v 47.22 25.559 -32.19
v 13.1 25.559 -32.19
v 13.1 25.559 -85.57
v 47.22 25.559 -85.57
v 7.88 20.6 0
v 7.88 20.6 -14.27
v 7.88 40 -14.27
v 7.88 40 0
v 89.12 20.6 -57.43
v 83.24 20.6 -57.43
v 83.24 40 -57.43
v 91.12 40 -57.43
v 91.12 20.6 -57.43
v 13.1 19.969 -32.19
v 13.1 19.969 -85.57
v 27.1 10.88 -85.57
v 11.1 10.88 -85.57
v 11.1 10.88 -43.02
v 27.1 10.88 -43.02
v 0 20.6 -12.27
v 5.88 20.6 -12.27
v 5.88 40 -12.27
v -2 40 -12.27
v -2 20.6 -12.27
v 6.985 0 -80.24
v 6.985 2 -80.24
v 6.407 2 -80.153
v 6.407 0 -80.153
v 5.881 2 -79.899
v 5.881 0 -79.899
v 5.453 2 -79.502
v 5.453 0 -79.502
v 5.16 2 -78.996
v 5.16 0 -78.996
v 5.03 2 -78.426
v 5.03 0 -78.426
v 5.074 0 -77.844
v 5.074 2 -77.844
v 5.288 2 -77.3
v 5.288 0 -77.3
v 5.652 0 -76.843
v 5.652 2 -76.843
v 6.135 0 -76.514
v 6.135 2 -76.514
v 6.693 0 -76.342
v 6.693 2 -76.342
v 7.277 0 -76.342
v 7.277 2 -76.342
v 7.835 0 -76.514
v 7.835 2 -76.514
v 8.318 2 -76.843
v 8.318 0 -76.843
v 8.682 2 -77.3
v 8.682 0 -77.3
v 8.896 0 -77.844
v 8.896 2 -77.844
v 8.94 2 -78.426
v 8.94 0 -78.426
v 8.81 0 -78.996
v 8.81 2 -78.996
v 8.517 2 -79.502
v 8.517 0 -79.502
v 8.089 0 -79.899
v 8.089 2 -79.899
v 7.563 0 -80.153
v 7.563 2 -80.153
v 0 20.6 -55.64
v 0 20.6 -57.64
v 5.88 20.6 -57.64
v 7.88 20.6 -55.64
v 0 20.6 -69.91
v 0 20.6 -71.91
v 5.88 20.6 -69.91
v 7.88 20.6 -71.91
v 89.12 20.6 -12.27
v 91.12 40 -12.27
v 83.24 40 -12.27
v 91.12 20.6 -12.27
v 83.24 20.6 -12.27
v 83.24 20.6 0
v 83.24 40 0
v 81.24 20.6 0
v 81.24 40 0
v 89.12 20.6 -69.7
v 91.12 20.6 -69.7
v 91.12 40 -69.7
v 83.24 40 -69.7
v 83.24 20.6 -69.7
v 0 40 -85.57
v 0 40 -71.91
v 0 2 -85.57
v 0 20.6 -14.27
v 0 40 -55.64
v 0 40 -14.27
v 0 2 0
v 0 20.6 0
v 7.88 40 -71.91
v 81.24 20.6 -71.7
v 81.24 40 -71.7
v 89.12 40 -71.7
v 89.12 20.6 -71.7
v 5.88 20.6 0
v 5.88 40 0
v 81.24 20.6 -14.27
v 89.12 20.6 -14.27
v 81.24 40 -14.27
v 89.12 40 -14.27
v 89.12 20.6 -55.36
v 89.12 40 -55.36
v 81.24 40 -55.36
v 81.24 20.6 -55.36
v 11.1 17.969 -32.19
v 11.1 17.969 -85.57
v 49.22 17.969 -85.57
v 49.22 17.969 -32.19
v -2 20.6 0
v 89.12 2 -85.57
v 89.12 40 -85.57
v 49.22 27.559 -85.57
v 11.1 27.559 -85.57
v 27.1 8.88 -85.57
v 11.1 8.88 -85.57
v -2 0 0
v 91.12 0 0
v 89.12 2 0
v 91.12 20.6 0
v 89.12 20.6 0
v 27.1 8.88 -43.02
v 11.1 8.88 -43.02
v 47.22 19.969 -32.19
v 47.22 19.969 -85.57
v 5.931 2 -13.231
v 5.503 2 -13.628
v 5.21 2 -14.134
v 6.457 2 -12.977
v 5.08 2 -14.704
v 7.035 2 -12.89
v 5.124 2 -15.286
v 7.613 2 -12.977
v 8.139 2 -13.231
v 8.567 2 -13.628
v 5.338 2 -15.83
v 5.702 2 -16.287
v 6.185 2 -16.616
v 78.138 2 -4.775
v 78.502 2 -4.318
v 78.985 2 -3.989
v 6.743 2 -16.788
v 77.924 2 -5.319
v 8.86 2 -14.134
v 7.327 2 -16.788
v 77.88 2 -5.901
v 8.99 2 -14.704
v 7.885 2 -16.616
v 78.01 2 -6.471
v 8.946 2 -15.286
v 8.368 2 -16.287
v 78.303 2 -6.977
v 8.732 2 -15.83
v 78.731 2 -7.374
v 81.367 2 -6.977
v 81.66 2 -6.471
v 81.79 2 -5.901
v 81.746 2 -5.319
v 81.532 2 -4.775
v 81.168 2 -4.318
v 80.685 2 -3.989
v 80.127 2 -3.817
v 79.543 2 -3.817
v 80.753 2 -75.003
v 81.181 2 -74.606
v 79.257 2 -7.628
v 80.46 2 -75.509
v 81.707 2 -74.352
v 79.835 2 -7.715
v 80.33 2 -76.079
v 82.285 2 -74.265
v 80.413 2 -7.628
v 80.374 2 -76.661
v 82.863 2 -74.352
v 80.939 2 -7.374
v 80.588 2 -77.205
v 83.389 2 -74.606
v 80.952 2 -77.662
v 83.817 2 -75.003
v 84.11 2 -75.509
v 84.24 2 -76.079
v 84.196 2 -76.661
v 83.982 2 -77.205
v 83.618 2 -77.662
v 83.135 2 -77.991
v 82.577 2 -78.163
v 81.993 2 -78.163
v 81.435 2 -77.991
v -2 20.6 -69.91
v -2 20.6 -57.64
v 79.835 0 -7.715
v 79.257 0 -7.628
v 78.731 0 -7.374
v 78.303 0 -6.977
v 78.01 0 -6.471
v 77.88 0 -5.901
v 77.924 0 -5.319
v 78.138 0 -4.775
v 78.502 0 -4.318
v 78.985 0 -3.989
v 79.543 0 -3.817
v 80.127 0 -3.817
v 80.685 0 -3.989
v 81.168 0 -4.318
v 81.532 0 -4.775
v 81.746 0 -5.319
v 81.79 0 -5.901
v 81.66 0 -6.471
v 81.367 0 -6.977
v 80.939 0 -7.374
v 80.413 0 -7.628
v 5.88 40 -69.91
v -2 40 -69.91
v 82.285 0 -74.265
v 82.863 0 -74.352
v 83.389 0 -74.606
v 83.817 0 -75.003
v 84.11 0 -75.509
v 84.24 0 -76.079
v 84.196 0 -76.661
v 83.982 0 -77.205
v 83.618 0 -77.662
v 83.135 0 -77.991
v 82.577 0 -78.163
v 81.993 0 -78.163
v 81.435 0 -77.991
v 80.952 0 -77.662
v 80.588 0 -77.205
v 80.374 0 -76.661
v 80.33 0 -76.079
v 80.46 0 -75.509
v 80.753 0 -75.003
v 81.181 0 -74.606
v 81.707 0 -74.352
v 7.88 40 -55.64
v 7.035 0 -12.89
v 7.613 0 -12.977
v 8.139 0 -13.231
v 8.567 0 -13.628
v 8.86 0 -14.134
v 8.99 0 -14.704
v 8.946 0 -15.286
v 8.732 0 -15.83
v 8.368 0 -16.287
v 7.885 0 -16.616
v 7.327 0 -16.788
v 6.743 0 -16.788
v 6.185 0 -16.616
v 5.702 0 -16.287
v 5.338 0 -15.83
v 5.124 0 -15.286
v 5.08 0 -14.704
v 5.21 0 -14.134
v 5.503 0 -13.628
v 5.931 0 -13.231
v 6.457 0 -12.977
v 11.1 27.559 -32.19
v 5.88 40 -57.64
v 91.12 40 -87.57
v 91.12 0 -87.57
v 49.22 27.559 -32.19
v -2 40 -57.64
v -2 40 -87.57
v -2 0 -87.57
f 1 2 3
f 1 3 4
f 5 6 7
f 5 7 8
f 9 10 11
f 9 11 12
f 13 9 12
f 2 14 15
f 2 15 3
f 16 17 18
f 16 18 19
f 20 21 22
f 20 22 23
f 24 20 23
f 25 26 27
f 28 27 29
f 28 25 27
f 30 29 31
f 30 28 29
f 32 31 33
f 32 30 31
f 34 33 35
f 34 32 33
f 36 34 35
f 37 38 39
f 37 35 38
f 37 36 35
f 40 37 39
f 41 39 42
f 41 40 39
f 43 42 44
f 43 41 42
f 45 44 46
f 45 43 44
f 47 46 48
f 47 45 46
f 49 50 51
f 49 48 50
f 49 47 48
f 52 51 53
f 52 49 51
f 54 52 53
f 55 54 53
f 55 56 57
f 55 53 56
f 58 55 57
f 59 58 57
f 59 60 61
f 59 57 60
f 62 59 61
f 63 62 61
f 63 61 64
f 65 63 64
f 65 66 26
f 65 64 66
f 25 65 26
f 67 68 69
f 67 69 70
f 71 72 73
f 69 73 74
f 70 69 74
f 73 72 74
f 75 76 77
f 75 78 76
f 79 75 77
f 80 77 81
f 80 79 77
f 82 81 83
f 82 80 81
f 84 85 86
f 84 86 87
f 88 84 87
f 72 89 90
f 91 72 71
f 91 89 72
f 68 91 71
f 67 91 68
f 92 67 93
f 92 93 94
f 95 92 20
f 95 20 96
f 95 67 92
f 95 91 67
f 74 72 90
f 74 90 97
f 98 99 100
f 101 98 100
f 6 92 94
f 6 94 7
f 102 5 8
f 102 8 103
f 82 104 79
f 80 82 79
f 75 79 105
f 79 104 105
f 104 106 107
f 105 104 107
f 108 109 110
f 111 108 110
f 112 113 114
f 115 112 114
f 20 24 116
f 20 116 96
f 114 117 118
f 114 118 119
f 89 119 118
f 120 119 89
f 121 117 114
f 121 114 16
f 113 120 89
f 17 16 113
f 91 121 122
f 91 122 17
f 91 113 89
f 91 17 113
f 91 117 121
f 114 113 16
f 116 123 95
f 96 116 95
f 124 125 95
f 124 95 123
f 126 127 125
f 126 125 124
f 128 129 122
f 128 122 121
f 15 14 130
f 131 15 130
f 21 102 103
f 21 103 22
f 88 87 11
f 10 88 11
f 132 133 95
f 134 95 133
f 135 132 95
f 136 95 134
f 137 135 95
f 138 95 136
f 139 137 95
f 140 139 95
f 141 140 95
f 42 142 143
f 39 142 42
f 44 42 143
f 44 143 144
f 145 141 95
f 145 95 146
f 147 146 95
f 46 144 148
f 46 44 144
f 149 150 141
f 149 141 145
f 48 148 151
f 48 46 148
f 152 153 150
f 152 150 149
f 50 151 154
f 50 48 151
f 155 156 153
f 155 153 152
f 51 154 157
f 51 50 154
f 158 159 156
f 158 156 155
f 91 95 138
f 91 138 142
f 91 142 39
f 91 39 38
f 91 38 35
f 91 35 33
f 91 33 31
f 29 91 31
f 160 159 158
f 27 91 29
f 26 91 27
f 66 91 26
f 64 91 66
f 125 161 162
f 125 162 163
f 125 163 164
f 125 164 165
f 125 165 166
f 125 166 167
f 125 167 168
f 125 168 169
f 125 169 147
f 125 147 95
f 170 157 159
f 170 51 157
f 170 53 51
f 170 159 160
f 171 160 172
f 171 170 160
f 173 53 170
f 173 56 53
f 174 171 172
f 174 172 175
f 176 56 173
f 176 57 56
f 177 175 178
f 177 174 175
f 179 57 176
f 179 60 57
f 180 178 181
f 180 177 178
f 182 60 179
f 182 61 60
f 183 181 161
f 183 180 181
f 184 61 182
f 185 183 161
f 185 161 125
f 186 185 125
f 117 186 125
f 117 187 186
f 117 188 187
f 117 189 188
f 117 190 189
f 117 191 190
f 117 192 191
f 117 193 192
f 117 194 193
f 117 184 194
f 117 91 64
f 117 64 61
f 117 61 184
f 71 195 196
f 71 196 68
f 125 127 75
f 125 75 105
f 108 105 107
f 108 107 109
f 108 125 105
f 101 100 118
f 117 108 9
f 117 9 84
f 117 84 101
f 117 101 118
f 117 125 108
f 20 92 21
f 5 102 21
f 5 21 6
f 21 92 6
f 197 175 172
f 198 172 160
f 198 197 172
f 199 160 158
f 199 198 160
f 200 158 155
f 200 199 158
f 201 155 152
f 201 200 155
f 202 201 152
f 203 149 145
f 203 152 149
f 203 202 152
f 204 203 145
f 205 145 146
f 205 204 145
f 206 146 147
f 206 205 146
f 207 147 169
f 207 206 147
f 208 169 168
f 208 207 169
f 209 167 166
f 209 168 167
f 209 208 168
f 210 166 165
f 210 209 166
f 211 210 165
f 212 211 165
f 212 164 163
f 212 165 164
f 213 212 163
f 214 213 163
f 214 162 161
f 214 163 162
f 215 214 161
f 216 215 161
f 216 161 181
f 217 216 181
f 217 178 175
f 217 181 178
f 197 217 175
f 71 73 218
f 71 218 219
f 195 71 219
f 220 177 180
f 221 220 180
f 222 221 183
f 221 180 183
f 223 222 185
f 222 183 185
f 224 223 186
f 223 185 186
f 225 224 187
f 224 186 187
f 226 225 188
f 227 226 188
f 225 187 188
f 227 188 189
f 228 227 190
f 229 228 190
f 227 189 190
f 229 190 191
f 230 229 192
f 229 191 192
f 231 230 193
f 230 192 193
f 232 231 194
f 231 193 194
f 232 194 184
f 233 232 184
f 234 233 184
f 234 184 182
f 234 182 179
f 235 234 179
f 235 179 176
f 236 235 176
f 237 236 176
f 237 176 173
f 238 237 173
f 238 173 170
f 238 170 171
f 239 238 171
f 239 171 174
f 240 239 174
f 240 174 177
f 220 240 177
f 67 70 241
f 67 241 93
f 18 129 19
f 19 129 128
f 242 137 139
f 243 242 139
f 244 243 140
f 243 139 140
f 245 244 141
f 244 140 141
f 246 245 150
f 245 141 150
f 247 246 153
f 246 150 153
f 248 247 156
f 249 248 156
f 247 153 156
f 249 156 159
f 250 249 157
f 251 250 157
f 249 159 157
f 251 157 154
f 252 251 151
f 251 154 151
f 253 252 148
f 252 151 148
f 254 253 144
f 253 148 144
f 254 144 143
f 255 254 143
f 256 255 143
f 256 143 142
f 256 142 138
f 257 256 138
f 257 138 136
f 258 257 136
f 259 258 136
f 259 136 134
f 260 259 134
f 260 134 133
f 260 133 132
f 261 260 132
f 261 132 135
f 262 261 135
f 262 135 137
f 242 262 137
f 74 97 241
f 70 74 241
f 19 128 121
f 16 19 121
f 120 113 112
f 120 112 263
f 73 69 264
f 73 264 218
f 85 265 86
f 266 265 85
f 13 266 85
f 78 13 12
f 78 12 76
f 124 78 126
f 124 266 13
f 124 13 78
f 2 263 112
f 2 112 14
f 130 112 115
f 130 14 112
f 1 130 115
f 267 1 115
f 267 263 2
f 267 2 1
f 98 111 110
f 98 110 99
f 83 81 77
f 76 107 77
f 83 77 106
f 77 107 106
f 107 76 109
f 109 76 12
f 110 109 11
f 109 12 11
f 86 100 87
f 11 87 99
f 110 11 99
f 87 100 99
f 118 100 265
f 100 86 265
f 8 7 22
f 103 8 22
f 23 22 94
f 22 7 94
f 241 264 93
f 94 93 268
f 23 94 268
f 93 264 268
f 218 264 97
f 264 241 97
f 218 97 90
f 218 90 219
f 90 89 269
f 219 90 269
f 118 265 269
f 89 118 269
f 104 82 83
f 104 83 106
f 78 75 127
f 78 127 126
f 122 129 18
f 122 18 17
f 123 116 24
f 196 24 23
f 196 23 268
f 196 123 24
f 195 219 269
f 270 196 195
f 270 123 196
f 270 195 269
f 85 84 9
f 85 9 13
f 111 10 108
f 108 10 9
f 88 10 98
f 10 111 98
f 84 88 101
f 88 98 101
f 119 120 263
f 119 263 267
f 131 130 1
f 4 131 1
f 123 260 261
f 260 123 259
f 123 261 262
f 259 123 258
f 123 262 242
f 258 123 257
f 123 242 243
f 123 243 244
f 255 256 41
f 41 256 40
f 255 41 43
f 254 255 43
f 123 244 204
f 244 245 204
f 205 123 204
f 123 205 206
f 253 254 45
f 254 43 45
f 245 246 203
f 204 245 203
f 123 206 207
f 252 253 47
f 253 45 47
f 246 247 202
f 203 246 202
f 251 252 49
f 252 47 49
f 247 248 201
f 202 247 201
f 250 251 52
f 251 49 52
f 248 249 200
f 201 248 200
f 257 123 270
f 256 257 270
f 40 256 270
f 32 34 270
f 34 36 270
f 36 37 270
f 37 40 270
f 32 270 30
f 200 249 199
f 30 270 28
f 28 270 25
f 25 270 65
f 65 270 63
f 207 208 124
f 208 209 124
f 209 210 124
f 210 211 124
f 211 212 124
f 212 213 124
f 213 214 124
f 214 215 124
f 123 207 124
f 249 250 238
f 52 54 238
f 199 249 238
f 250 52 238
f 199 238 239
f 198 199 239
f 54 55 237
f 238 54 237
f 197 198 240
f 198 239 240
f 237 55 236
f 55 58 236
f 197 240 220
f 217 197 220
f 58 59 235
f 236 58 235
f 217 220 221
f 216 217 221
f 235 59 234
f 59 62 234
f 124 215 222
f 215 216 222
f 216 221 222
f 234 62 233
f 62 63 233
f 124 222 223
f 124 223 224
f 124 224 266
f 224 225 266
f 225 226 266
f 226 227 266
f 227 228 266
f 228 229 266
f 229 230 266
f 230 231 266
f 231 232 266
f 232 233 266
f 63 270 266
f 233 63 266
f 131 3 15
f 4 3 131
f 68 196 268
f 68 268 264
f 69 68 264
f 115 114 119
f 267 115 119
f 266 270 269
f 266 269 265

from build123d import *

# Parameters (mm, degrees)
SKETCH1_W            = 89.12
SKETCH1_H            = 85.57
BOSS_EXTRUDE1_DEPTH  = 2
SKETCH3_W            = 2
SKETCH3_H            = 30
BOSS_EXTRUDE2_DEPTH  = 85.57
SKETCH4_W            = 2
SKETCH4_H            = 30
BOSS_EXTRUDE3_DEPTH  = 85.57
SKETCH5_W            = 93.12
SKETCH5_H            = 2
BOSS_EXTRUDE4_DEPTH  = 30
SKETCH6_R            = 1.96
CUT_EXTRUDE2_DEPTH   = 30
SKETCH7_R            = 1.96
CUT_EXTRUDE3_DEPTH   = 30
SKETCH8_R            = 1.96
CUT_EXTRUDE4_DEPTH   = 30
SKETCH9_R            = 1.96
CUT_EXTRUDE5_DEPTH   = 30
SKETCH11_W           = 2
SKETCH11_H           = 12.27
BOSS_EXTRUDE5_DEPTH  = 9.4
SKETCH12_W           = 2
SKETCH12_H           = 12.27
CUT_EXTRUDE6_DEPTH   = 9.4
SKETCH13_W           = 2
SKETCH13_H           = 12.27
BOSS_EXTRUDE6_DEPTH  = 9.4
SKETCH14_W           = 2
SKETCH14_H           = 12.27
CUT_EXTRUDE7_DEPTH   = 9.4
SKETCH15_W           = 2
SKETCH15_H           = 12.27
BOSS_EXTRUDE7_DEPTH  = 9.4
SKETCH16_W           = 2
SKETCH16_H           = 12.27
CUT_EXTRUDE8_DEPTH   = 9.4
SKETCH17_W           = 2
SKETCH17_H           = 12.27
BOSS_EXTRUDE8_DEPTH  = 9.4
SKETCH18_W           = 2
SKETCH18_H           = 12.27
CUT_EXTRUDE9_DEPTH   = 9.4
BOSS_EXTRUDE9_DEPTH  = 10
SKETCH20_W           = 16
SKETCH20_H           = 42.55
BOSS_EXTRUDE10_DEPTH = 8.88
SKETCH21_W           = 16
SKETCH21_H           = 6.88
CUT_EXTRUDE10_DEPTH  = 42.55
SKETCH22_W           = 38.12
SKETCH22_H           = 9.59
BOSS_EXTRUDE11_DEPTH = 53.38
SKETCH23_W           = 34.12
SKETCH23_H           = 5.59
CUT_EXTRUDE11_DEPTH  = 53.38


with BuildPart() as part:
    # Sketch1 → Boss-Extrude1 (new body)
    with BuildSketch(Plane(origin=(0, 0, 0), x_dir=(1, 0, 0), z_dir=(0, 1, 0))):
        with Locations((44.56, 42.785)):
            Rectangle(SKETCH1_W, SKETCH1_H)
    extrude(amount=BOSS_EXTRUDE1_DEPTH)

    # Sketch3 → Boss-Extrude2 (add)
    with BuildSketch(Plane.XY):
        with Locations((-1, 15)):
            Rectangle(SKETCH3_W, SKETCH3_H)
    extrude(amount=-BOSS_EXTRUDE2_DEPTH)

    # Sketch4 → Boss-Extrude3 (add)
    with BuildSketch(Plane.XY):
        with Locations((90.12, 15)):
            Rectangle(SKETCH4_W, SKETCH4_H)
    extrude(amount=-BOSS_EXTRUDE3_DEPTH)

    # Sketch5 → Boss-Extrude4 (add)
    with BuildSketch(Plane(origin=(0, 0, 0), x_dir=(1, 0, 0), z_dir=(0, 1, 0))):
        with Locations((44.56, 86.57)):
            Rectangle(SKETCH5_W, SKETCH5_H)
    extrude(amount=BOSS_EXTRUDE4_DEPTH)

    # Sketch6 → Cut-Extrude2 (cut)
    with BuildSketch(Plane(origin=(0, 0, 0), x_dir=(1, 0, 0), z_dir=(0, 1, 0))):
        with Locations(Location((79.835, 5.755, 0), (0, 0, 90))):
            Circle(SKETCH6_R)
    extrude(amount=CUT_EXTRUDE2_DEPTH, mode=Mode.SUBTRACT)

    # Sketch7 → Cut-Extrude3 (cut)
    with BuildSketch(Plane(origin=(0, 2, 0), x_dir=(1, 0, 0), z_dir=(0, 1, 0))):
        with Locations(Location((82.285, 76.225, 0), (0, 0, 270))):
            Circle(SKETCH7_R)
    extrude(amount=-CUT_EXTRUDE3_DEPTH, mode=Mode.SUBTRACT)

    # Sketch8 → Cut-Extrude4 (cut)
    with BuildSketch(Plane(origin=(0, 0, 0), x_dir=(1, 0, 0), z_dir=(0, 1, 0))):
        with Locations(Location((6.985, 78.28, 0), (0, 0, 90))):
            Circle(SKETCH8_R)
    extrude(amount=CUT_EXTRUDE4_DEPTH, mode=Mode.SUBTRACT)

    # Sketch9 → Cut-Extrude5 (cut)
    with BuildSketch(Plane(origin=(0, 2, 0), x_dir=(1, 0, 0), z_dir=(0, 1, 0))):
        with Locations(Location((7.035, 14.85, 0), (0, 0, 270))):
            Circle(SKETCH9_R)
    extrude(amount=-CUT_EXTRUDE5_DEPTH, mode=Mode.SUBTRACT)

    # Sketch11 → Boss-Extrude5 (add)
    with BuildSketch(Plane(origin=(0, 30, 0), x_dir=(1, 0, 0), z_dir=(0, 1, 0))):
        Polygon((83.24, 12.27), (89.12, 12.27), (89.12, 14.27), (81.24, 14.27), (81.24, 12.27), align=None)
        with Locations((82.24, 6.135)):
            Rectangle(SKETCH11_W, SKETCH11_H)
    extrude(amount=-BOSS_EXTRUDE5_DEPTH)

    # Sketch12 → Cut-Extrude6 (cut)
    with BuildSketch(Plane(origin=(0, 30, 0), x_dir=(1, 0, 0), z_dir=(0, 1, 0))):
        with Locations((90.12, 6.135)):
            Rectangle(SKETCH12_W, SKETCH12_H)
    extrude(amount=-CUT_EXTRUDE6_DEPTH, mode=Mode.SUBTRACT)

    # Sketch13 → Boss-Extrude6 (add)
    with BuildSketch(Plane(origin=(0, 30, 0), x_dir=(1, 0, 0), z_dir=(0, 1, 0))):
        Polygon((83.24, 69.7), (89.12, 69.7), (89.12, 71.7), (81.24, 71.7), (81.24, 69.7), align=None)
        with Locations((82.24, 63.565)):
            Rectangle(SKETCH13_W, SKETCH13_H)
        Polygon((89.12, 55.359786784), (89.12, 57.43), (83.24, 57.43), (81.24, 57.43), (81.24, 55.359786784), align=None)
    extrude(amount=-BOSS_EXTRUDE6_DEPTH)

    # Sketch14 → Cut-Extrude7 (cut)
    with BuildSketch(Plane(origin=(0, 30, 0), x_dir=(1, 0, 0), z_dir=(0, 1, 0))):
        with Locations((90.12, 63.565)):
            Rectangle(SKETCH14_W, SKETCH14_H)
    extrude(amount=-CUT_EXTRUDE7_DEPTH, mode=Mode.SUBTRACT)

    # Sketch15 → Boss-Extrude7 (add)
    with BuildSketch(Plane(origin=(0, 30, 0), x_dir=(1, 0, 0), z_dir=(0, 1, 0))):
        Polygon((0, 71.91), (0, 69.91), (5.88, 69.91), (7.88, 69.91), (7.88, 71.91), align=None)
        with Locations((6.88, 63.775)):
            Rectangle(SKETCH15_W, SKETCH15_H)
        Polygon((5.88, 57.64), (0, 57.64), (0, 55.64), (7.88, 55.64), (7.88, 57.64), align=None)
    extrude(amount=-BOSS_EXTRUDE7_DEPTH)

    # Sketch16 → Cut-Extrude8 (cut)
    with BuildSketch(Plane(origin=(0, 30, 0), x_dir=(1, 0, 0), z_dir=(0, 1, 0))):
        with Locations((-1, 63.775)):
            Rectangle(SKETCH16_W, SKETCH16_H)
    extrude(amount=-CUT_EXTRUDE8_DEPTH, mode=Mode.SUBTRACT)

    # Sketch17 → Boss-Extrude8 (add)
    with BuildSketch(Plane(origin=(0, 30, 0), x_dir=(1, 0, 0), z_dir=(0, 1, 0))):
        Polygon((0, 14.27), (0, 12.27), (5.88, 12.27), (7.88, 12.27), (7.88, 14.27), align=None)
        with Locations((6.88, 6.135)):
            Rectangle(SKETCH17_W, SKETCH17_H)
    extrude(amount=-BOSS_EXTRUDE8_DEPTH)

    # Sketch18 → Cut-Extrude9 (cut)
    with BuildSketch(Plane(origin=(0, 30, 0), x_dir=(1, 0, 0), z_dir=(0, 1, 0))):
        with Locations((-1, 6.135)):
            Rectangle(SKETCH18_W, SKETCH18_H)
    extrude(amount=-CUT_EXTRUDE9_DEPTH, mode=Mode.SUBTRACT)

    # Sketch19 → Boss-Extrude9 (add)
    with BuildSketch(Plane(origin=(0, 30, 0), x_dir=(1, 0, 0), z_dir=(0, 1, 0))):
        Polygon((83.24, 0), (81.24, 0), (81.24, 14.27), (89.12, 14.27), (89.12, 55.359786784), (81.24, 55.359786784), (81.24, 71.7), (89.12, 71.7), (89.12, 85.57), (0, 85.57), (0, 71.91), (7.88, 71.91), (7.88, 55.64), (0, 55.64), (0, 14.27), (7.88, 14.27), (7.88, 0), (5.88, 0), (5.88, 12.27), (-2, 12.27), (-2, 57.64), (5.88, 57.64), (5.88, 69.91), (-2, 69.91), (-2, 87.57), (91.12, 87.57), (91.12, 69.7), (83.24, 69.7), (83.24, 57.43), (91.12, 57.43), (91.12, 12.27), (83.24, 12.27), align=None)
    extrude(amount=BOSS_EXTRUDE9_DEPTH)

    # Sketch20 → Boss-Extrude10 (add)
    with BuildSketch(Plane(origin=(0, 2, 0), x_dir=(1, 0, 0), z_dir=(0, 1, 0))):
        with Locations((19.1, 64.295)):
            Rectangle(SKETCH20_W, SKETCH20_H)
    extrude(amount=BOSS_EXTRUDE10_DEPTH)

    # Sketch21 → Cut-Extrude10 (cut)
    with BuildSketch(Plane.XY.offset(-43.02)):
        with Locations((19.1, 5.44)):
            Rectangle(SKETCH21_W, SKETCH21_H)
    extrude(amount=-CUT_EXTRUDE10_DEPTH, mode=Mode.SUBTRACT)

    # Sketch22 → Boss-Extrude11 (add)
    with BuildSketch(Plane.XY.offset(-85.57)):
        with Locations((30.16, 22.763941004)):
            Rectangle(SKETCH22_W, SKETCH22_H)
    extrude(amount=BOSS_EXTRUDE11_DEPTH)

    # Sketch23 → Cut-Extrude11 (cut)
    with BuildSketch(Plane.XY.offset(-32.19)):
        with Locations((30.16, 22.763941004)):
            Rectangle(SKETCH23_W, SKETCH23_H)
    extrude(amount=-CUT_EXTRUDE11_DEPTH, mode=Mode.SUBTRACT)


solid = part.part
